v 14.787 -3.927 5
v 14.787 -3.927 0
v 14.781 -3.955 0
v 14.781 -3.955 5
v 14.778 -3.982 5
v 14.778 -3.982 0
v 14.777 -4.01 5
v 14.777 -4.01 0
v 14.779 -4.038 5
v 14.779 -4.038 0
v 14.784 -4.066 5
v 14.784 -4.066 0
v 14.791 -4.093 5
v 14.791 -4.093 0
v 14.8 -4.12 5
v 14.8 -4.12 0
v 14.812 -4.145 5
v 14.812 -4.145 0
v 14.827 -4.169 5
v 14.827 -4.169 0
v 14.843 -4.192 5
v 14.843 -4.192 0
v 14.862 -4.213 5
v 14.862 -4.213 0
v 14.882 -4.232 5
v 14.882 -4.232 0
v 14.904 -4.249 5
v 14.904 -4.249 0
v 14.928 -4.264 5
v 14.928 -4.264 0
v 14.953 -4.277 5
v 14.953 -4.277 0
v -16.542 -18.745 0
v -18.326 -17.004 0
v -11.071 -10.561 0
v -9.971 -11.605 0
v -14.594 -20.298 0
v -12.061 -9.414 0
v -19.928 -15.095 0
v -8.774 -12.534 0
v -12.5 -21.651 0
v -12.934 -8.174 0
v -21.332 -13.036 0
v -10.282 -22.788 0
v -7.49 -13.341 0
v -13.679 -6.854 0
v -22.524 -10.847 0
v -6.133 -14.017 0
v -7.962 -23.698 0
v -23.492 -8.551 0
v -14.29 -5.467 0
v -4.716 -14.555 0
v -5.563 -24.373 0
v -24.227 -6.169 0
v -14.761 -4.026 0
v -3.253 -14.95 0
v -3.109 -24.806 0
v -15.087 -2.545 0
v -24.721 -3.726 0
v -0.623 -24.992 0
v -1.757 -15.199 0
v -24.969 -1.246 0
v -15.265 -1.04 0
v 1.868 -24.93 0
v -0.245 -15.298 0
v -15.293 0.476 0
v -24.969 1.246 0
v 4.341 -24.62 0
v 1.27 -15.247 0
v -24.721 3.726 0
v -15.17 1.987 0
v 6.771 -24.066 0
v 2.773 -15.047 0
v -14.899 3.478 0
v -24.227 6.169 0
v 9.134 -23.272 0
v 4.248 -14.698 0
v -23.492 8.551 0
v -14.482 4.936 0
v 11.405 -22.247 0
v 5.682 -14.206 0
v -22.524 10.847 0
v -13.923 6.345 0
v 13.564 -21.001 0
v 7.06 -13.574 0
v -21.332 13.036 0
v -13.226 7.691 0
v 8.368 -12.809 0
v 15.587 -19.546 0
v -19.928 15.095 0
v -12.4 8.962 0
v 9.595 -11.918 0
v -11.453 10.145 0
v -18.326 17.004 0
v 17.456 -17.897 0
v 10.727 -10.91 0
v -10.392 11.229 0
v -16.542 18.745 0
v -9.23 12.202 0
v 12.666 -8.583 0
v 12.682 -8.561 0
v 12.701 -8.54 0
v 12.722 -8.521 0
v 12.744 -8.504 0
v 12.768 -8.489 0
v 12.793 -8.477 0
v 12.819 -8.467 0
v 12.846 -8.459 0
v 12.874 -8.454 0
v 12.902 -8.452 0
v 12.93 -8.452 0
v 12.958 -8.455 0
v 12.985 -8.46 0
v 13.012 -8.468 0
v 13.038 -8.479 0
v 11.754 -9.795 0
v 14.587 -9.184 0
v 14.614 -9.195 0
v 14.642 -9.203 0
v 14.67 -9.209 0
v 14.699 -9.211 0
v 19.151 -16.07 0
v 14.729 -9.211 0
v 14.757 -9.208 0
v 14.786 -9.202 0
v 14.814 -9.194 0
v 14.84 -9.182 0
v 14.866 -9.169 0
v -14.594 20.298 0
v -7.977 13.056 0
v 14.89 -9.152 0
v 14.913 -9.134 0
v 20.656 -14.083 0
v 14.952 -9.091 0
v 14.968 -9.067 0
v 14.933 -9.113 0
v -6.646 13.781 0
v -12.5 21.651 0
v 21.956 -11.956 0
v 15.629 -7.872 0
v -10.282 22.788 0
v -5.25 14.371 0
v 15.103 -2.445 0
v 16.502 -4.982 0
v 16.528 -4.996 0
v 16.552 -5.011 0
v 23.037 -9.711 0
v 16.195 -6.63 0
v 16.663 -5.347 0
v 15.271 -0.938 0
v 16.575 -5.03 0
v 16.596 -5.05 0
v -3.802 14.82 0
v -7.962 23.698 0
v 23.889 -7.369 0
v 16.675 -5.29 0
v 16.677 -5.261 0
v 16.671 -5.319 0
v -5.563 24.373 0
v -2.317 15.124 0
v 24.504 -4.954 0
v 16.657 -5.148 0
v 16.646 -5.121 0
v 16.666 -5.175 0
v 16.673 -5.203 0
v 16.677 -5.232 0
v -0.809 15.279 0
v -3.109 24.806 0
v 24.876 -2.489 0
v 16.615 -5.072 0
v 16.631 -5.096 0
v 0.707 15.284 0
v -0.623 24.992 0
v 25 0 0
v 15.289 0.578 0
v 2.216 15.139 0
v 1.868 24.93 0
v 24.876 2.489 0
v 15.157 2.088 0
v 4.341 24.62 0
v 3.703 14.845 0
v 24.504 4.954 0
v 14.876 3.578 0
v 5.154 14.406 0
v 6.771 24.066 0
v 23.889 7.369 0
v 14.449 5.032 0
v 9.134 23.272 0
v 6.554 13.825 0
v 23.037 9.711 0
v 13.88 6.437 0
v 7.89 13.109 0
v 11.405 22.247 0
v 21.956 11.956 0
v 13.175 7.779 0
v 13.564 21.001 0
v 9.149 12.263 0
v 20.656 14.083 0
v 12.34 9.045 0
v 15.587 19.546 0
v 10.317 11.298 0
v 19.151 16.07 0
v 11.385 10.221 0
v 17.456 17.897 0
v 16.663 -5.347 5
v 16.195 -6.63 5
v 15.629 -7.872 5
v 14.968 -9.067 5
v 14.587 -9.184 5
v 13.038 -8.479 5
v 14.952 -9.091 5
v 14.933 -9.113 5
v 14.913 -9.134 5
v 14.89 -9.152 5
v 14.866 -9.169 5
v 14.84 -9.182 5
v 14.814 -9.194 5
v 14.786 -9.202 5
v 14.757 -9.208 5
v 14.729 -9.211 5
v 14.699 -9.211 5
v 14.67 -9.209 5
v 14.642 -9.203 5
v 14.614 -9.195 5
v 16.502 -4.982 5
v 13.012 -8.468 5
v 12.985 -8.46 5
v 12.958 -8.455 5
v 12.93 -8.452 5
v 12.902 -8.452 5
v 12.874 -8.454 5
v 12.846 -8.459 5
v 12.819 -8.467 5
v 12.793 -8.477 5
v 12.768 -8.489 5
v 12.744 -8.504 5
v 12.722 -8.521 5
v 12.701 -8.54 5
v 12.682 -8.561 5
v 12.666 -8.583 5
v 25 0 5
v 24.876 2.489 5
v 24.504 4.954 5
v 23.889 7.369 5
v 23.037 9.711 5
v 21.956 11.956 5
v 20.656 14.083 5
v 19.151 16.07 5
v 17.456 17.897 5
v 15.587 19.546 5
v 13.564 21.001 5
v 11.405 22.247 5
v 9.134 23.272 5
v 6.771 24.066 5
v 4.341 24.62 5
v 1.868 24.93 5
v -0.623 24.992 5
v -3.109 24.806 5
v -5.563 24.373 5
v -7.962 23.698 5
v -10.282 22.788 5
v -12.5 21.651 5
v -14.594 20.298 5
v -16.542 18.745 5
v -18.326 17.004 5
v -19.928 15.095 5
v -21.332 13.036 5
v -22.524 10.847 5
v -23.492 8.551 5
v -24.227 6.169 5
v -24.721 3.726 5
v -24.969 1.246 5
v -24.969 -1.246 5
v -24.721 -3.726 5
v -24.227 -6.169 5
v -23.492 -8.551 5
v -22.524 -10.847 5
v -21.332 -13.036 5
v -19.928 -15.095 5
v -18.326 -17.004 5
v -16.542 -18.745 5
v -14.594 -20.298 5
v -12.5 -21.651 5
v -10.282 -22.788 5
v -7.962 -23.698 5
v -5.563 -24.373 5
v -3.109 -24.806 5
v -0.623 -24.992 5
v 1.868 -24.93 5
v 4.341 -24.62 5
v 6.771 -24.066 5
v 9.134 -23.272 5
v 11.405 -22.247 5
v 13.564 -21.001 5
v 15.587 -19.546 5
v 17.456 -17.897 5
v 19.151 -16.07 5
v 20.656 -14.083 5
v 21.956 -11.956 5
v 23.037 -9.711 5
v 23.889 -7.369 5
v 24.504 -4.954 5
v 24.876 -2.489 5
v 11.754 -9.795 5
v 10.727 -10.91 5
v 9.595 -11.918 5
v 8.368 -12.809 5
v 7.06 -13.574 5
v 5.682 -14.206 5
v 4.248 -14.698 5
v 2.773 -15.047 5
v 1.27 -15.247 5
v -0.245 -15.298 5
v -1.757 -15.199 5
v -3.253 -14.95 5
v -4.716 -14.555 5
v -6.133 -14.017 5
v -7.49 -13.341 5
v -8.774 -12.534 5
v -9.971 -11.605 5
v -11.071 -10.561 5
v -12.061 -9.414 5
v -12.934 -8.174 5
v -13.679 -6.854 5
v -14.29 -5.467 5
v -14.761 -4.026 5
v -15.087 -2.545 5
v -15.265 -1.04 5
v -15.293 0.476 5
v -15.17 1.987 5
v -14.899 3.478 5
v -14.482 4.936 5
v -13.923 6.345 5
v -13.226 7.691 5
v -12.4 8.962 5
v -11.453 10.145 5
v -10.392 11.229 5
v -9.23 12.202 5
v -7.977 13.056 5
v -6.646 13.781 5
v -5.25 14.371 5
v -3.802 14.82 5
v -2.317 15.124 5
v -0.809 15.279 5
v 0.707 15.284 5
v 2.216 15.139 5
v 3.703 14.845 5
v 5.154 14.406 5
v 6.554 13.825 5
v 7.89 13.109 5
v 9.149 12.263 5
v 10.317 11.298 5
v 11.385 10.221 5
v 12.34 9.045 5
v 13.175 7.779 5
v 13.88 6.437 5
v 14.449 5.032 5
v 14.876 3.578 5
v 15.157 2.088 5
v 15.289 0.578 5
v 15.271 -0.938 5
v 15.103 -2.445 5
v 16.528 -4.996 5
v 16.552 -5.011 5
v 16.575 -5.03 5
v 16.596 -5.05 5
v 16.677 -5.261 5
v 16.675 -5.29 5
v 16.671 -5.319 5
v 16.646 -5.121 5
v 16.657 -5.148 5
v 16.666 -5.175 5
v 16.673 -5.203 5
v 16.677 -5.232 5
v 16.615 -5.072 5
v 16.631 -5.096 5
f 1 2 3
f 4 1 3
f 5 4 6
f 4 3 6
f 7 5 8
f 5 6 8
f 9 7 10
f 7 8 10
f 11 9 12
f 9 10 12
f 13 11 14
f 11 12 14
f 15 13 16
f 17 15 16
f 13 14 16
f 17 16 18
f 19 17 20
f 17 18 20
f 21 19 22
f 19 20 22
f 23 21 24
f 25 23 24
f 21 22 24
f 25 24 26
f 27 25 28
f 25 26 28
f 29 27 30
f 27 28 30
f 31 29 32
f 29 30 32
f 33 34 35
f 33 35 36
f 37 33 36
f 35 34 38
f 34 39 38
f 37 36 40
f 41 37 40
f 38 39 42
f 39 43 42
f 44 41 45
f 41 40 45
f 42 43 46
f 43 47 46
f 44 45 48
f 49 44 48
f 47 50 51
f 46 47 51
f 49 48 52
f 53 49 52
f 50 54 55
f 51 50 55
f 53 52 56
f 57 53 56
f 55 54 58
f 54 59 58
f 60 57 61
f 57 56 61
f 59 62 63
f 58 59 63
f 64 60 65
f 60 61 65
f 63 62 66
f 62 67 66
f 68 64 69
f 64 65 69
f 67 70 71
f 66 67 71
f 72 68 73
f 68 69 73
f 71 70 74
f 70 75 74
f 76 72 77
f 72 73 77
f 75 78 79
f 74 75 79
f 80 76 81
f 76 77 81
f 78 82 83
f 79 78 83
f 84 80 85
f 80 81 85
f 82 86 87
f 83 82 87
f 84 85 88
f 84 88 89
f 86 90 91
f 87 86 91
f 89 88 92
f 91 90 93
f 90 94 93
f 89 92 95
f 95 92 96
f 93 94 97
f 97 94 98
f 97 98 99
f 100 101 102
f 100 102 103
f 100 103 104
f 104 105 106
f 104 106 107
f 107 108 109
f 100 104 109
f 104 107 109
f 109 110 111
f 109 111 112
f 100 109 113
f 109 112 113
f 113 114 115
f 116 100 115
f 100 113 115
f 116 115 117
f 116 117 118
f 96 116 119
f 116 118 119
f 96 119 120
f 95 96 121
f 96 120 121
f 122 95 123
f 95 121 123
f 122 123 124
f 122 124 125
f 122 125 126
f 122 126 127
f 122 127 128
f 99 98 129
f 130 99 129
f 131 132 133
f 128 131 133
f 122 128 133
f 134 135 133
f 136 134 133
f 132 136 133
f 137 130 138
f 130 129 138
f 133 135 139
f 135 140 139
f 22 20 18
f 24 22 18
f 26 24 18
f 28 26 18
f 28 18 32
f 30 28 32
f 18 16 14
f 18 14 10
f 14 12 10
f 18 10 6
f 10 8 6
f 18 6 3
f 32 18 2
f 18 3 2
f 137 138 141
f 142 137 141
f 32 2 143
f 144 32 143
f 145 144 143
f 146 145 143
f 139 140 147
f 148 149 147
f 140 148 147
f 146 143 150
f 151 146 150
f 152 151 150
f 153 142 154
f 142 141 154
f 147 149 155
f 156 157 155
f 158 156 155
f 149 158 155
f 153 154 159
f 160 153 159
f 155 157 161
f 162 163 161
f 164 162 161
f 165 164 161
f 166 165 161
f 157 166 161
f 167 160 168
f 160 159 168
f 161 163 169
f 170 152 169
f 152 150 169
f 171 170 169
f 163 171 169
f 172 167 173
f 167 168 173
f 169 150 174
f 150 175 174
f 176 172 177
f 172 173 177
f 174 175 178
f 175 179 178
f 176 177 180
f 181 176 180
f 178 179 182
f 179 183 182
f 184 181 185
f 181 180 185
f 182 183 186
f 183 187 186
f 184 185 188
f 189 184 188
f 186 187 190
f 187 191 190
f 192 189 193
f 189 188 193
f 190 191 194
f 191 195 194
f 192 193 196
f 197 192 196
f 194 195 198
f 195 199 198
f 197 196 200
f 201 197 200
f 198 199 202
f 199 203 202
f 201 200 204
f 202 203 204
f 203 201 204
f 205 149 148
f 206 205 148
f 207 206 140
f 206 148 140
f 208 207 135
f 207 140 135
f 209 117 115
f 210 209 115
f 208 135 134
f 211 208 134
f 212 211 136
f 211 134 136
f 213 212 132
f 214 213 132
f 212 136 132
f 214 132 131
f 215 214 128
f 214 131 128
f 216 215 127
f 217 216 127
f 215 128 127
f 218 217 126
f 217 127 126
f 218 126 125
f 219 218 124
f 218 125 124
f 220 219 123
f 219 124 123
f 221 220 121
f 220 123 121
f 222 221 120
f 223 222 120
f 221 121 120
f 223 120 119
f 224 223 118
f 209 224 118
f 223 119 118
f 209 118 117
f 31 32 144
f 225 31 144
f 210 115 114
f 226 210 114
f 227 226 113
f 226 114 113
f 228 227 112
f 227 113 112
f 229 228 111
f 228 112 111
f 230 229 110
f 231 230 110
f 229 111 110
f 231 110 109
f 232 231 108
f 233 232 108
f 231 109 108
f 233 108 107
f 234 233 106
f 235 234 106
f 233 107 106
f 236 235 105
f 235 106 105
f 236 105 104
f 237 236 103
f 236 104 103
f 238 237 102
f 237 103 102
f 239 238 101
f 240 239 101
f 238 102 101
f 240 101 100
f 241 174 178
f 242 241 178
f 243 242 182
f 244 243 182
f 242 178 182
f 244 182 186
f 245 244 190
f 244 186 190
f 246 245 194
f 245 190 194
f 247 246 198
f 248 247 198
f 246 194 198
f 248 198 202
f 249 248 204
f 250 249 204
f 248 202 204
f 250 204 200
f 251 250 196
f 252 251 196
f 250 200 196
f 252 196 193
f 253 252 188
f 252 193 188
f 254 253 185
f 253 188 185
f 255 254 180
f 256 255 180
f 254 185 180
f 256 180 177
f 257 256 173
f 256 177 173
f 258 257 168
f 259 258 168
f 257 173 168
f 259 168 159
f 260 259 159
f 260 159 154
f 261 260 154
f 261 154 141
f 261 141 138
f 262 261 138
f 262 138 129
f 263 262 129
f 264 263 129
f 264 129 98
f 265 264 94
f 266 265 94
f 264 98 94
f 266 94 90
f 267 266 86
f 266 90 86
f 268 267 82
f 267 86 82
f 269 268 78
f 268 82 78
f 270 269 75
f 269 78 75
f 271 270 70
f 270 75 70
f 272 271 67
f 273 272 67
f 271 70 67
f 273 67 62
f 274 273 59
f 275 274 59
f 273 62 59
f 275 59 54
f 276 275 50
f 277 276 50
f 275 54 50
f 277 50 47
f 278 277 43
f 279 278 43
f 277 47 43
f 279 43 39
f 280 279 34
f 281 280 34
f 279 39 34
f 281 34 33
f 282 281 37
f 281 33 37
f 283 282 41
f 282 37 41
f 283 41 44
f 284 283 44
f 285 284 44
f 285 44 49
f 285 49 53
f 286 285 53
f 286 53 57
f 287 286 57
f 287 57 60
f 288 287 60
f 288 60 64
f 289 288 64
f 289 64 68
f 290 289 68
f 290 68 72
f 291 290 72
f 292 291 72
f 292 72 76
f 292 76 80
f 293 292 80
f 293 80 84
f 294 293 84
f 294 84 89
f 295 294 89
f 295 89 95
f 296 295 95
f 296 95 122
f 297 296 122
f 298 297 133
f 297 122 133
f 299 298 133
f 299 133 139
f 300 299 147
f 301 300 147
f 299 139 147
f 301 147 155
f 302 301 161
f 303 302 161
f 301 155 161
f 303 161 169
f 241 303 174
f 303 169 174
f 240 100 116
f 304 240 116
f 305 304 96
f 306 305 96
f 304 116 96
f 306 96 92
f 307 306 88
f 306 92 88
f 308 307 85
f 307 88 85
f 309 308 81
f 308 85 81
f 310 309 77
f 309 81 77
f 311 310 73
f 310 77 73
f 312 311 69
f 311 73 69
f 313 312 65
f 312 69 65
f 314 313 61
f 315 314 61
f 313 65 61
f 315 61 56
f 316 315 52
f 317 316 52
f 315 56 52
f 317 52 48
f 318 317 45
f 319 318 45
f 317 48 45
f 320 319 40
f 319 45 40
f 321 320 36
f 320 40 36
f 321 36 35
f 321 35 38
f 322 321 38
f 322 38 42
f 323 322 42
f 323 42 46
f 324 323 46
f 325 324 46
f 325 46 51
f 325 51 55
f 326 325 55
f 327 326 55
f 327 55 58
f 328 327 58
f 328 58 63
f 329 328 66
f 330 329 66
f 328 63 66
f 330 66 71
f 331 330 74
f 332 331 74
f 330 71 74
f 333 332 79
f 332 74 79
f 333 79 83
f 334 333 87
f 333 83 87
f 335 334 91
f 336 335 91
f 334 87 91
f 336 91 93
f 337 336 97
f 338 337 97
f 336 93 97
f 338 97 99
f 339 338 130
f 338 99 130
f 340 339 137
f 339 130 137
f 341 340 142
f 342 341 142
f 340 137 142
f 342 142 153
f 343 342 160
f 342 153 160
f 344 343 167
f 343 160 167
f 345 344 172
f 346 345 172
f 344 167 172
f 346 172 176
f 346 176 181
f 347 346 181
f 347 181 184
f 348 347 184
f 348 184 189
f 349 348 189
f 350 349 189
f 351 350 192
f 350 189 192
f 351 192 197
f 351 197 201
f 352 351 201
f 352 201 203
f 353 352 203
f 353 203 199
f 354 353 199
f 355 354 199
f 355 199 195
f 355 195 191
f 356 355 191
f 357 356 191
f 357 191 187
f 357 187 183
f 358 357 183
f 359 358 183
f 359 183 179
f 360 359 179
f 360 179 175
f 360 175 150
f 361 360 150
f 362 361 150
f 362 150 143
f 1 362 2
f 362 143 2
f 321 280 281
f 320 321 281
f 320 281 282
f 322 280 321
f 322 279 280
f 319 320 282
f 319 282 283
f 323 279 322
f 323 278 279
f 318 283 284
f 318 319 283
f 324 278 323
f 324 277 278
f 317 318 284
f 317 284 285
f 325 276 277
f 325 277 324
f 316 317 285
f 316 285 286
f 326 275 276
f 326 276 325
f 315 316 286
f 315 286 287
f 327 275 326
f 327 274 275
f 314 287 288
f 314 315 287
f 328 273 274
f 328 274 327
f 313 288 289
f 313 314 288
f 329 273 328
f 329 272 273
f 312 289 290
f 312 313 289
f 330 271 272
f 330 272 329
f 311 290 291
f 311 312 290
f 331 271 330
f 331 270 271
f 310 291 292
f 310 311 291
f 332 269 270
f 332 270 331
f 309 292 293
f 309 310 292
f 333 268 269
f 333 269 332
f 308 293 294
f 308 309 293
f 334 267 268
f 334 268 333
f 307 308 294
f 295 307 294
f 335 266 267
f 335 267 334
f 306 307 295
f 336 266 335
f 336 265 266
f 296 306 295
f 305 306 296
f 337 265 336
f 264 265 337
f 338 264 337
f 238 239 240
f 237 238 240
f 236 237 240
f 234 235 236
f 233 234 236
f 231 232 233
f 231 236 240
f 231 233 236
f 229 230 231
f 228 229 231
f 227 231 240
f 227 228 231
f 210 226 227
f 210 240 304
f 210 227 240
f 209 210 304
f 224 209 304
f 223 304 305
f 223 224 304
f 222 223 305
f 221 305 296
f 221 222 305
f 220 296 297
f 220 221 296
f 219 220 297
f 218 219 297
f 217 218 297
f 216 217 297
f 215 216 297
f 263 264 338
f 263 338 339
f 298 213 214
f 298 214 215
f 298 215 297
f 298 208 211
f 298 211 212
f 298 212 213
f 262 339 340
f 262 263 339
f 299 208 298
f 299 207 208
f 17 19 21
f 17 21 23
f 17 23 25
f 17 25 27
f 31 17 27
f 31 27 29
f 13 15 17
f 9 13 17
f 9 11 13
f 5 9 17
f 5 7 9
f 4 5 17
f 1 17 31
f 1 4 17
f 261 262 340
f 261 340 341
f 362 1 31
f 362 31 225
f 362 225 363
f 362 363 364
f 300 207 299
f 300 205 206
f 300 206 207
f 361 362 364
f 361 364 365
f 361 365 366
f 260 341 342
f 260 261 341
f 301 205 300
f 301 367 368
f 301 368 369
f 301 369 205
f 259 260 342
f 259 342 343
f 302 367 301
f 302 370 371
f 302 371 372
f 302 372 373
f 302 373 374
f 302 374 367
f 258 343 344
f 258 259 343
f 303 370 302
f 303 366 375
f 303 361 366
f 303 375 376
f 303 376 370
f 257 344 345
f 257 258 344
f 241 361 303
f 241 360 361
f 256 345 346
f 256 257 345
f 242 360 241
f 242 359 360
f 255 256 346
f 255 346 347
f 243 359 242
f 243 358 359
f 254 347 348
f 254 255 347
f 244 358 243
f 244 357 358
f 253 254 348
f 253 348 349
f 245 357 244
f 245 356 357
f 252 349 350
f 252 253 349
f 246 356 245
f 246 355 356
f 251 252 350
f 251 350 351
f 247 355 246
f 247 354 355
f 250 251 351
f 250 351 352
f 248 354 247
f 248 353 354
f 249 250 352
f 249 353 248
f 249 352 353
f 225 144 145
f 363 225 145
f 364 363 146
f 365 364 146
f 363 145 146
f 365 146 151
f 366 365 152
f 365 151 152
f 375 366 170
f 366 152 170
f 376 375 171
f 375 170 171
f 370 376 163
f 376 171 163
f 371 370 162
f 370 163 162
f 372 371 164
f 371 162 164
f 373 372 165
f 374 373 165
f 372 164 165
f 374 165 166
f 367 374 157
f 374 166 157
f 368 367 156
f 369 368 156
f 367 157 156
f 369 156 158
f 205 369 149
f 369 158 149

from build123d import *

# Parameters (mm, degrees)
ESQUISSE1_R        = 25
BOSS_EXTRU_1_DEPTH = 5


with BuildPart() as part:
    # Esquisse1 → Boss.-Extru.1 (new body)
    with BuildSketch(Plane.XY):
        Circle(ESQUISSE1_R)
        with BuildLine():
            Line((14.953030626, -4.277181575), (16.501758042, -4.982426557))
            ThreePointArc((16.501758042, -4.982426557), (16.651785463, -5.134087079), (16.663083329, -5.347116418))
            ThreePointArc((16.663083329, -5.347116418), (15.924531384, -7.256672806), (14.968008895, -9.066901881))
            ThreePointArc((14.968008895, -9.066901881), (14.799864591, -9.198133844), (14.587009397, -9.184458985))
            Line((14.587009397, -9.184458985), (13.038282108, -8.478683252))
            ThreePointArc((13.038282108, -8.478683252), (12.832759155, -8.462847948), (12.665533258, -8.583371557))
            ThreePointArc((12.665533258, -8.583371557), (-13.922503409, 6.344596033), (14.787409001, -3.927153556))
            ThreePointArc((14.787409001, -3.927153556), (14.806182583, -4.132467854), (14.953030626, -4.277181575))
        make_face(mode=Mode.SUBTRACT)
    extrude(amount=BOSS_EXTRU_1_DEPTH)


solid = part.part
